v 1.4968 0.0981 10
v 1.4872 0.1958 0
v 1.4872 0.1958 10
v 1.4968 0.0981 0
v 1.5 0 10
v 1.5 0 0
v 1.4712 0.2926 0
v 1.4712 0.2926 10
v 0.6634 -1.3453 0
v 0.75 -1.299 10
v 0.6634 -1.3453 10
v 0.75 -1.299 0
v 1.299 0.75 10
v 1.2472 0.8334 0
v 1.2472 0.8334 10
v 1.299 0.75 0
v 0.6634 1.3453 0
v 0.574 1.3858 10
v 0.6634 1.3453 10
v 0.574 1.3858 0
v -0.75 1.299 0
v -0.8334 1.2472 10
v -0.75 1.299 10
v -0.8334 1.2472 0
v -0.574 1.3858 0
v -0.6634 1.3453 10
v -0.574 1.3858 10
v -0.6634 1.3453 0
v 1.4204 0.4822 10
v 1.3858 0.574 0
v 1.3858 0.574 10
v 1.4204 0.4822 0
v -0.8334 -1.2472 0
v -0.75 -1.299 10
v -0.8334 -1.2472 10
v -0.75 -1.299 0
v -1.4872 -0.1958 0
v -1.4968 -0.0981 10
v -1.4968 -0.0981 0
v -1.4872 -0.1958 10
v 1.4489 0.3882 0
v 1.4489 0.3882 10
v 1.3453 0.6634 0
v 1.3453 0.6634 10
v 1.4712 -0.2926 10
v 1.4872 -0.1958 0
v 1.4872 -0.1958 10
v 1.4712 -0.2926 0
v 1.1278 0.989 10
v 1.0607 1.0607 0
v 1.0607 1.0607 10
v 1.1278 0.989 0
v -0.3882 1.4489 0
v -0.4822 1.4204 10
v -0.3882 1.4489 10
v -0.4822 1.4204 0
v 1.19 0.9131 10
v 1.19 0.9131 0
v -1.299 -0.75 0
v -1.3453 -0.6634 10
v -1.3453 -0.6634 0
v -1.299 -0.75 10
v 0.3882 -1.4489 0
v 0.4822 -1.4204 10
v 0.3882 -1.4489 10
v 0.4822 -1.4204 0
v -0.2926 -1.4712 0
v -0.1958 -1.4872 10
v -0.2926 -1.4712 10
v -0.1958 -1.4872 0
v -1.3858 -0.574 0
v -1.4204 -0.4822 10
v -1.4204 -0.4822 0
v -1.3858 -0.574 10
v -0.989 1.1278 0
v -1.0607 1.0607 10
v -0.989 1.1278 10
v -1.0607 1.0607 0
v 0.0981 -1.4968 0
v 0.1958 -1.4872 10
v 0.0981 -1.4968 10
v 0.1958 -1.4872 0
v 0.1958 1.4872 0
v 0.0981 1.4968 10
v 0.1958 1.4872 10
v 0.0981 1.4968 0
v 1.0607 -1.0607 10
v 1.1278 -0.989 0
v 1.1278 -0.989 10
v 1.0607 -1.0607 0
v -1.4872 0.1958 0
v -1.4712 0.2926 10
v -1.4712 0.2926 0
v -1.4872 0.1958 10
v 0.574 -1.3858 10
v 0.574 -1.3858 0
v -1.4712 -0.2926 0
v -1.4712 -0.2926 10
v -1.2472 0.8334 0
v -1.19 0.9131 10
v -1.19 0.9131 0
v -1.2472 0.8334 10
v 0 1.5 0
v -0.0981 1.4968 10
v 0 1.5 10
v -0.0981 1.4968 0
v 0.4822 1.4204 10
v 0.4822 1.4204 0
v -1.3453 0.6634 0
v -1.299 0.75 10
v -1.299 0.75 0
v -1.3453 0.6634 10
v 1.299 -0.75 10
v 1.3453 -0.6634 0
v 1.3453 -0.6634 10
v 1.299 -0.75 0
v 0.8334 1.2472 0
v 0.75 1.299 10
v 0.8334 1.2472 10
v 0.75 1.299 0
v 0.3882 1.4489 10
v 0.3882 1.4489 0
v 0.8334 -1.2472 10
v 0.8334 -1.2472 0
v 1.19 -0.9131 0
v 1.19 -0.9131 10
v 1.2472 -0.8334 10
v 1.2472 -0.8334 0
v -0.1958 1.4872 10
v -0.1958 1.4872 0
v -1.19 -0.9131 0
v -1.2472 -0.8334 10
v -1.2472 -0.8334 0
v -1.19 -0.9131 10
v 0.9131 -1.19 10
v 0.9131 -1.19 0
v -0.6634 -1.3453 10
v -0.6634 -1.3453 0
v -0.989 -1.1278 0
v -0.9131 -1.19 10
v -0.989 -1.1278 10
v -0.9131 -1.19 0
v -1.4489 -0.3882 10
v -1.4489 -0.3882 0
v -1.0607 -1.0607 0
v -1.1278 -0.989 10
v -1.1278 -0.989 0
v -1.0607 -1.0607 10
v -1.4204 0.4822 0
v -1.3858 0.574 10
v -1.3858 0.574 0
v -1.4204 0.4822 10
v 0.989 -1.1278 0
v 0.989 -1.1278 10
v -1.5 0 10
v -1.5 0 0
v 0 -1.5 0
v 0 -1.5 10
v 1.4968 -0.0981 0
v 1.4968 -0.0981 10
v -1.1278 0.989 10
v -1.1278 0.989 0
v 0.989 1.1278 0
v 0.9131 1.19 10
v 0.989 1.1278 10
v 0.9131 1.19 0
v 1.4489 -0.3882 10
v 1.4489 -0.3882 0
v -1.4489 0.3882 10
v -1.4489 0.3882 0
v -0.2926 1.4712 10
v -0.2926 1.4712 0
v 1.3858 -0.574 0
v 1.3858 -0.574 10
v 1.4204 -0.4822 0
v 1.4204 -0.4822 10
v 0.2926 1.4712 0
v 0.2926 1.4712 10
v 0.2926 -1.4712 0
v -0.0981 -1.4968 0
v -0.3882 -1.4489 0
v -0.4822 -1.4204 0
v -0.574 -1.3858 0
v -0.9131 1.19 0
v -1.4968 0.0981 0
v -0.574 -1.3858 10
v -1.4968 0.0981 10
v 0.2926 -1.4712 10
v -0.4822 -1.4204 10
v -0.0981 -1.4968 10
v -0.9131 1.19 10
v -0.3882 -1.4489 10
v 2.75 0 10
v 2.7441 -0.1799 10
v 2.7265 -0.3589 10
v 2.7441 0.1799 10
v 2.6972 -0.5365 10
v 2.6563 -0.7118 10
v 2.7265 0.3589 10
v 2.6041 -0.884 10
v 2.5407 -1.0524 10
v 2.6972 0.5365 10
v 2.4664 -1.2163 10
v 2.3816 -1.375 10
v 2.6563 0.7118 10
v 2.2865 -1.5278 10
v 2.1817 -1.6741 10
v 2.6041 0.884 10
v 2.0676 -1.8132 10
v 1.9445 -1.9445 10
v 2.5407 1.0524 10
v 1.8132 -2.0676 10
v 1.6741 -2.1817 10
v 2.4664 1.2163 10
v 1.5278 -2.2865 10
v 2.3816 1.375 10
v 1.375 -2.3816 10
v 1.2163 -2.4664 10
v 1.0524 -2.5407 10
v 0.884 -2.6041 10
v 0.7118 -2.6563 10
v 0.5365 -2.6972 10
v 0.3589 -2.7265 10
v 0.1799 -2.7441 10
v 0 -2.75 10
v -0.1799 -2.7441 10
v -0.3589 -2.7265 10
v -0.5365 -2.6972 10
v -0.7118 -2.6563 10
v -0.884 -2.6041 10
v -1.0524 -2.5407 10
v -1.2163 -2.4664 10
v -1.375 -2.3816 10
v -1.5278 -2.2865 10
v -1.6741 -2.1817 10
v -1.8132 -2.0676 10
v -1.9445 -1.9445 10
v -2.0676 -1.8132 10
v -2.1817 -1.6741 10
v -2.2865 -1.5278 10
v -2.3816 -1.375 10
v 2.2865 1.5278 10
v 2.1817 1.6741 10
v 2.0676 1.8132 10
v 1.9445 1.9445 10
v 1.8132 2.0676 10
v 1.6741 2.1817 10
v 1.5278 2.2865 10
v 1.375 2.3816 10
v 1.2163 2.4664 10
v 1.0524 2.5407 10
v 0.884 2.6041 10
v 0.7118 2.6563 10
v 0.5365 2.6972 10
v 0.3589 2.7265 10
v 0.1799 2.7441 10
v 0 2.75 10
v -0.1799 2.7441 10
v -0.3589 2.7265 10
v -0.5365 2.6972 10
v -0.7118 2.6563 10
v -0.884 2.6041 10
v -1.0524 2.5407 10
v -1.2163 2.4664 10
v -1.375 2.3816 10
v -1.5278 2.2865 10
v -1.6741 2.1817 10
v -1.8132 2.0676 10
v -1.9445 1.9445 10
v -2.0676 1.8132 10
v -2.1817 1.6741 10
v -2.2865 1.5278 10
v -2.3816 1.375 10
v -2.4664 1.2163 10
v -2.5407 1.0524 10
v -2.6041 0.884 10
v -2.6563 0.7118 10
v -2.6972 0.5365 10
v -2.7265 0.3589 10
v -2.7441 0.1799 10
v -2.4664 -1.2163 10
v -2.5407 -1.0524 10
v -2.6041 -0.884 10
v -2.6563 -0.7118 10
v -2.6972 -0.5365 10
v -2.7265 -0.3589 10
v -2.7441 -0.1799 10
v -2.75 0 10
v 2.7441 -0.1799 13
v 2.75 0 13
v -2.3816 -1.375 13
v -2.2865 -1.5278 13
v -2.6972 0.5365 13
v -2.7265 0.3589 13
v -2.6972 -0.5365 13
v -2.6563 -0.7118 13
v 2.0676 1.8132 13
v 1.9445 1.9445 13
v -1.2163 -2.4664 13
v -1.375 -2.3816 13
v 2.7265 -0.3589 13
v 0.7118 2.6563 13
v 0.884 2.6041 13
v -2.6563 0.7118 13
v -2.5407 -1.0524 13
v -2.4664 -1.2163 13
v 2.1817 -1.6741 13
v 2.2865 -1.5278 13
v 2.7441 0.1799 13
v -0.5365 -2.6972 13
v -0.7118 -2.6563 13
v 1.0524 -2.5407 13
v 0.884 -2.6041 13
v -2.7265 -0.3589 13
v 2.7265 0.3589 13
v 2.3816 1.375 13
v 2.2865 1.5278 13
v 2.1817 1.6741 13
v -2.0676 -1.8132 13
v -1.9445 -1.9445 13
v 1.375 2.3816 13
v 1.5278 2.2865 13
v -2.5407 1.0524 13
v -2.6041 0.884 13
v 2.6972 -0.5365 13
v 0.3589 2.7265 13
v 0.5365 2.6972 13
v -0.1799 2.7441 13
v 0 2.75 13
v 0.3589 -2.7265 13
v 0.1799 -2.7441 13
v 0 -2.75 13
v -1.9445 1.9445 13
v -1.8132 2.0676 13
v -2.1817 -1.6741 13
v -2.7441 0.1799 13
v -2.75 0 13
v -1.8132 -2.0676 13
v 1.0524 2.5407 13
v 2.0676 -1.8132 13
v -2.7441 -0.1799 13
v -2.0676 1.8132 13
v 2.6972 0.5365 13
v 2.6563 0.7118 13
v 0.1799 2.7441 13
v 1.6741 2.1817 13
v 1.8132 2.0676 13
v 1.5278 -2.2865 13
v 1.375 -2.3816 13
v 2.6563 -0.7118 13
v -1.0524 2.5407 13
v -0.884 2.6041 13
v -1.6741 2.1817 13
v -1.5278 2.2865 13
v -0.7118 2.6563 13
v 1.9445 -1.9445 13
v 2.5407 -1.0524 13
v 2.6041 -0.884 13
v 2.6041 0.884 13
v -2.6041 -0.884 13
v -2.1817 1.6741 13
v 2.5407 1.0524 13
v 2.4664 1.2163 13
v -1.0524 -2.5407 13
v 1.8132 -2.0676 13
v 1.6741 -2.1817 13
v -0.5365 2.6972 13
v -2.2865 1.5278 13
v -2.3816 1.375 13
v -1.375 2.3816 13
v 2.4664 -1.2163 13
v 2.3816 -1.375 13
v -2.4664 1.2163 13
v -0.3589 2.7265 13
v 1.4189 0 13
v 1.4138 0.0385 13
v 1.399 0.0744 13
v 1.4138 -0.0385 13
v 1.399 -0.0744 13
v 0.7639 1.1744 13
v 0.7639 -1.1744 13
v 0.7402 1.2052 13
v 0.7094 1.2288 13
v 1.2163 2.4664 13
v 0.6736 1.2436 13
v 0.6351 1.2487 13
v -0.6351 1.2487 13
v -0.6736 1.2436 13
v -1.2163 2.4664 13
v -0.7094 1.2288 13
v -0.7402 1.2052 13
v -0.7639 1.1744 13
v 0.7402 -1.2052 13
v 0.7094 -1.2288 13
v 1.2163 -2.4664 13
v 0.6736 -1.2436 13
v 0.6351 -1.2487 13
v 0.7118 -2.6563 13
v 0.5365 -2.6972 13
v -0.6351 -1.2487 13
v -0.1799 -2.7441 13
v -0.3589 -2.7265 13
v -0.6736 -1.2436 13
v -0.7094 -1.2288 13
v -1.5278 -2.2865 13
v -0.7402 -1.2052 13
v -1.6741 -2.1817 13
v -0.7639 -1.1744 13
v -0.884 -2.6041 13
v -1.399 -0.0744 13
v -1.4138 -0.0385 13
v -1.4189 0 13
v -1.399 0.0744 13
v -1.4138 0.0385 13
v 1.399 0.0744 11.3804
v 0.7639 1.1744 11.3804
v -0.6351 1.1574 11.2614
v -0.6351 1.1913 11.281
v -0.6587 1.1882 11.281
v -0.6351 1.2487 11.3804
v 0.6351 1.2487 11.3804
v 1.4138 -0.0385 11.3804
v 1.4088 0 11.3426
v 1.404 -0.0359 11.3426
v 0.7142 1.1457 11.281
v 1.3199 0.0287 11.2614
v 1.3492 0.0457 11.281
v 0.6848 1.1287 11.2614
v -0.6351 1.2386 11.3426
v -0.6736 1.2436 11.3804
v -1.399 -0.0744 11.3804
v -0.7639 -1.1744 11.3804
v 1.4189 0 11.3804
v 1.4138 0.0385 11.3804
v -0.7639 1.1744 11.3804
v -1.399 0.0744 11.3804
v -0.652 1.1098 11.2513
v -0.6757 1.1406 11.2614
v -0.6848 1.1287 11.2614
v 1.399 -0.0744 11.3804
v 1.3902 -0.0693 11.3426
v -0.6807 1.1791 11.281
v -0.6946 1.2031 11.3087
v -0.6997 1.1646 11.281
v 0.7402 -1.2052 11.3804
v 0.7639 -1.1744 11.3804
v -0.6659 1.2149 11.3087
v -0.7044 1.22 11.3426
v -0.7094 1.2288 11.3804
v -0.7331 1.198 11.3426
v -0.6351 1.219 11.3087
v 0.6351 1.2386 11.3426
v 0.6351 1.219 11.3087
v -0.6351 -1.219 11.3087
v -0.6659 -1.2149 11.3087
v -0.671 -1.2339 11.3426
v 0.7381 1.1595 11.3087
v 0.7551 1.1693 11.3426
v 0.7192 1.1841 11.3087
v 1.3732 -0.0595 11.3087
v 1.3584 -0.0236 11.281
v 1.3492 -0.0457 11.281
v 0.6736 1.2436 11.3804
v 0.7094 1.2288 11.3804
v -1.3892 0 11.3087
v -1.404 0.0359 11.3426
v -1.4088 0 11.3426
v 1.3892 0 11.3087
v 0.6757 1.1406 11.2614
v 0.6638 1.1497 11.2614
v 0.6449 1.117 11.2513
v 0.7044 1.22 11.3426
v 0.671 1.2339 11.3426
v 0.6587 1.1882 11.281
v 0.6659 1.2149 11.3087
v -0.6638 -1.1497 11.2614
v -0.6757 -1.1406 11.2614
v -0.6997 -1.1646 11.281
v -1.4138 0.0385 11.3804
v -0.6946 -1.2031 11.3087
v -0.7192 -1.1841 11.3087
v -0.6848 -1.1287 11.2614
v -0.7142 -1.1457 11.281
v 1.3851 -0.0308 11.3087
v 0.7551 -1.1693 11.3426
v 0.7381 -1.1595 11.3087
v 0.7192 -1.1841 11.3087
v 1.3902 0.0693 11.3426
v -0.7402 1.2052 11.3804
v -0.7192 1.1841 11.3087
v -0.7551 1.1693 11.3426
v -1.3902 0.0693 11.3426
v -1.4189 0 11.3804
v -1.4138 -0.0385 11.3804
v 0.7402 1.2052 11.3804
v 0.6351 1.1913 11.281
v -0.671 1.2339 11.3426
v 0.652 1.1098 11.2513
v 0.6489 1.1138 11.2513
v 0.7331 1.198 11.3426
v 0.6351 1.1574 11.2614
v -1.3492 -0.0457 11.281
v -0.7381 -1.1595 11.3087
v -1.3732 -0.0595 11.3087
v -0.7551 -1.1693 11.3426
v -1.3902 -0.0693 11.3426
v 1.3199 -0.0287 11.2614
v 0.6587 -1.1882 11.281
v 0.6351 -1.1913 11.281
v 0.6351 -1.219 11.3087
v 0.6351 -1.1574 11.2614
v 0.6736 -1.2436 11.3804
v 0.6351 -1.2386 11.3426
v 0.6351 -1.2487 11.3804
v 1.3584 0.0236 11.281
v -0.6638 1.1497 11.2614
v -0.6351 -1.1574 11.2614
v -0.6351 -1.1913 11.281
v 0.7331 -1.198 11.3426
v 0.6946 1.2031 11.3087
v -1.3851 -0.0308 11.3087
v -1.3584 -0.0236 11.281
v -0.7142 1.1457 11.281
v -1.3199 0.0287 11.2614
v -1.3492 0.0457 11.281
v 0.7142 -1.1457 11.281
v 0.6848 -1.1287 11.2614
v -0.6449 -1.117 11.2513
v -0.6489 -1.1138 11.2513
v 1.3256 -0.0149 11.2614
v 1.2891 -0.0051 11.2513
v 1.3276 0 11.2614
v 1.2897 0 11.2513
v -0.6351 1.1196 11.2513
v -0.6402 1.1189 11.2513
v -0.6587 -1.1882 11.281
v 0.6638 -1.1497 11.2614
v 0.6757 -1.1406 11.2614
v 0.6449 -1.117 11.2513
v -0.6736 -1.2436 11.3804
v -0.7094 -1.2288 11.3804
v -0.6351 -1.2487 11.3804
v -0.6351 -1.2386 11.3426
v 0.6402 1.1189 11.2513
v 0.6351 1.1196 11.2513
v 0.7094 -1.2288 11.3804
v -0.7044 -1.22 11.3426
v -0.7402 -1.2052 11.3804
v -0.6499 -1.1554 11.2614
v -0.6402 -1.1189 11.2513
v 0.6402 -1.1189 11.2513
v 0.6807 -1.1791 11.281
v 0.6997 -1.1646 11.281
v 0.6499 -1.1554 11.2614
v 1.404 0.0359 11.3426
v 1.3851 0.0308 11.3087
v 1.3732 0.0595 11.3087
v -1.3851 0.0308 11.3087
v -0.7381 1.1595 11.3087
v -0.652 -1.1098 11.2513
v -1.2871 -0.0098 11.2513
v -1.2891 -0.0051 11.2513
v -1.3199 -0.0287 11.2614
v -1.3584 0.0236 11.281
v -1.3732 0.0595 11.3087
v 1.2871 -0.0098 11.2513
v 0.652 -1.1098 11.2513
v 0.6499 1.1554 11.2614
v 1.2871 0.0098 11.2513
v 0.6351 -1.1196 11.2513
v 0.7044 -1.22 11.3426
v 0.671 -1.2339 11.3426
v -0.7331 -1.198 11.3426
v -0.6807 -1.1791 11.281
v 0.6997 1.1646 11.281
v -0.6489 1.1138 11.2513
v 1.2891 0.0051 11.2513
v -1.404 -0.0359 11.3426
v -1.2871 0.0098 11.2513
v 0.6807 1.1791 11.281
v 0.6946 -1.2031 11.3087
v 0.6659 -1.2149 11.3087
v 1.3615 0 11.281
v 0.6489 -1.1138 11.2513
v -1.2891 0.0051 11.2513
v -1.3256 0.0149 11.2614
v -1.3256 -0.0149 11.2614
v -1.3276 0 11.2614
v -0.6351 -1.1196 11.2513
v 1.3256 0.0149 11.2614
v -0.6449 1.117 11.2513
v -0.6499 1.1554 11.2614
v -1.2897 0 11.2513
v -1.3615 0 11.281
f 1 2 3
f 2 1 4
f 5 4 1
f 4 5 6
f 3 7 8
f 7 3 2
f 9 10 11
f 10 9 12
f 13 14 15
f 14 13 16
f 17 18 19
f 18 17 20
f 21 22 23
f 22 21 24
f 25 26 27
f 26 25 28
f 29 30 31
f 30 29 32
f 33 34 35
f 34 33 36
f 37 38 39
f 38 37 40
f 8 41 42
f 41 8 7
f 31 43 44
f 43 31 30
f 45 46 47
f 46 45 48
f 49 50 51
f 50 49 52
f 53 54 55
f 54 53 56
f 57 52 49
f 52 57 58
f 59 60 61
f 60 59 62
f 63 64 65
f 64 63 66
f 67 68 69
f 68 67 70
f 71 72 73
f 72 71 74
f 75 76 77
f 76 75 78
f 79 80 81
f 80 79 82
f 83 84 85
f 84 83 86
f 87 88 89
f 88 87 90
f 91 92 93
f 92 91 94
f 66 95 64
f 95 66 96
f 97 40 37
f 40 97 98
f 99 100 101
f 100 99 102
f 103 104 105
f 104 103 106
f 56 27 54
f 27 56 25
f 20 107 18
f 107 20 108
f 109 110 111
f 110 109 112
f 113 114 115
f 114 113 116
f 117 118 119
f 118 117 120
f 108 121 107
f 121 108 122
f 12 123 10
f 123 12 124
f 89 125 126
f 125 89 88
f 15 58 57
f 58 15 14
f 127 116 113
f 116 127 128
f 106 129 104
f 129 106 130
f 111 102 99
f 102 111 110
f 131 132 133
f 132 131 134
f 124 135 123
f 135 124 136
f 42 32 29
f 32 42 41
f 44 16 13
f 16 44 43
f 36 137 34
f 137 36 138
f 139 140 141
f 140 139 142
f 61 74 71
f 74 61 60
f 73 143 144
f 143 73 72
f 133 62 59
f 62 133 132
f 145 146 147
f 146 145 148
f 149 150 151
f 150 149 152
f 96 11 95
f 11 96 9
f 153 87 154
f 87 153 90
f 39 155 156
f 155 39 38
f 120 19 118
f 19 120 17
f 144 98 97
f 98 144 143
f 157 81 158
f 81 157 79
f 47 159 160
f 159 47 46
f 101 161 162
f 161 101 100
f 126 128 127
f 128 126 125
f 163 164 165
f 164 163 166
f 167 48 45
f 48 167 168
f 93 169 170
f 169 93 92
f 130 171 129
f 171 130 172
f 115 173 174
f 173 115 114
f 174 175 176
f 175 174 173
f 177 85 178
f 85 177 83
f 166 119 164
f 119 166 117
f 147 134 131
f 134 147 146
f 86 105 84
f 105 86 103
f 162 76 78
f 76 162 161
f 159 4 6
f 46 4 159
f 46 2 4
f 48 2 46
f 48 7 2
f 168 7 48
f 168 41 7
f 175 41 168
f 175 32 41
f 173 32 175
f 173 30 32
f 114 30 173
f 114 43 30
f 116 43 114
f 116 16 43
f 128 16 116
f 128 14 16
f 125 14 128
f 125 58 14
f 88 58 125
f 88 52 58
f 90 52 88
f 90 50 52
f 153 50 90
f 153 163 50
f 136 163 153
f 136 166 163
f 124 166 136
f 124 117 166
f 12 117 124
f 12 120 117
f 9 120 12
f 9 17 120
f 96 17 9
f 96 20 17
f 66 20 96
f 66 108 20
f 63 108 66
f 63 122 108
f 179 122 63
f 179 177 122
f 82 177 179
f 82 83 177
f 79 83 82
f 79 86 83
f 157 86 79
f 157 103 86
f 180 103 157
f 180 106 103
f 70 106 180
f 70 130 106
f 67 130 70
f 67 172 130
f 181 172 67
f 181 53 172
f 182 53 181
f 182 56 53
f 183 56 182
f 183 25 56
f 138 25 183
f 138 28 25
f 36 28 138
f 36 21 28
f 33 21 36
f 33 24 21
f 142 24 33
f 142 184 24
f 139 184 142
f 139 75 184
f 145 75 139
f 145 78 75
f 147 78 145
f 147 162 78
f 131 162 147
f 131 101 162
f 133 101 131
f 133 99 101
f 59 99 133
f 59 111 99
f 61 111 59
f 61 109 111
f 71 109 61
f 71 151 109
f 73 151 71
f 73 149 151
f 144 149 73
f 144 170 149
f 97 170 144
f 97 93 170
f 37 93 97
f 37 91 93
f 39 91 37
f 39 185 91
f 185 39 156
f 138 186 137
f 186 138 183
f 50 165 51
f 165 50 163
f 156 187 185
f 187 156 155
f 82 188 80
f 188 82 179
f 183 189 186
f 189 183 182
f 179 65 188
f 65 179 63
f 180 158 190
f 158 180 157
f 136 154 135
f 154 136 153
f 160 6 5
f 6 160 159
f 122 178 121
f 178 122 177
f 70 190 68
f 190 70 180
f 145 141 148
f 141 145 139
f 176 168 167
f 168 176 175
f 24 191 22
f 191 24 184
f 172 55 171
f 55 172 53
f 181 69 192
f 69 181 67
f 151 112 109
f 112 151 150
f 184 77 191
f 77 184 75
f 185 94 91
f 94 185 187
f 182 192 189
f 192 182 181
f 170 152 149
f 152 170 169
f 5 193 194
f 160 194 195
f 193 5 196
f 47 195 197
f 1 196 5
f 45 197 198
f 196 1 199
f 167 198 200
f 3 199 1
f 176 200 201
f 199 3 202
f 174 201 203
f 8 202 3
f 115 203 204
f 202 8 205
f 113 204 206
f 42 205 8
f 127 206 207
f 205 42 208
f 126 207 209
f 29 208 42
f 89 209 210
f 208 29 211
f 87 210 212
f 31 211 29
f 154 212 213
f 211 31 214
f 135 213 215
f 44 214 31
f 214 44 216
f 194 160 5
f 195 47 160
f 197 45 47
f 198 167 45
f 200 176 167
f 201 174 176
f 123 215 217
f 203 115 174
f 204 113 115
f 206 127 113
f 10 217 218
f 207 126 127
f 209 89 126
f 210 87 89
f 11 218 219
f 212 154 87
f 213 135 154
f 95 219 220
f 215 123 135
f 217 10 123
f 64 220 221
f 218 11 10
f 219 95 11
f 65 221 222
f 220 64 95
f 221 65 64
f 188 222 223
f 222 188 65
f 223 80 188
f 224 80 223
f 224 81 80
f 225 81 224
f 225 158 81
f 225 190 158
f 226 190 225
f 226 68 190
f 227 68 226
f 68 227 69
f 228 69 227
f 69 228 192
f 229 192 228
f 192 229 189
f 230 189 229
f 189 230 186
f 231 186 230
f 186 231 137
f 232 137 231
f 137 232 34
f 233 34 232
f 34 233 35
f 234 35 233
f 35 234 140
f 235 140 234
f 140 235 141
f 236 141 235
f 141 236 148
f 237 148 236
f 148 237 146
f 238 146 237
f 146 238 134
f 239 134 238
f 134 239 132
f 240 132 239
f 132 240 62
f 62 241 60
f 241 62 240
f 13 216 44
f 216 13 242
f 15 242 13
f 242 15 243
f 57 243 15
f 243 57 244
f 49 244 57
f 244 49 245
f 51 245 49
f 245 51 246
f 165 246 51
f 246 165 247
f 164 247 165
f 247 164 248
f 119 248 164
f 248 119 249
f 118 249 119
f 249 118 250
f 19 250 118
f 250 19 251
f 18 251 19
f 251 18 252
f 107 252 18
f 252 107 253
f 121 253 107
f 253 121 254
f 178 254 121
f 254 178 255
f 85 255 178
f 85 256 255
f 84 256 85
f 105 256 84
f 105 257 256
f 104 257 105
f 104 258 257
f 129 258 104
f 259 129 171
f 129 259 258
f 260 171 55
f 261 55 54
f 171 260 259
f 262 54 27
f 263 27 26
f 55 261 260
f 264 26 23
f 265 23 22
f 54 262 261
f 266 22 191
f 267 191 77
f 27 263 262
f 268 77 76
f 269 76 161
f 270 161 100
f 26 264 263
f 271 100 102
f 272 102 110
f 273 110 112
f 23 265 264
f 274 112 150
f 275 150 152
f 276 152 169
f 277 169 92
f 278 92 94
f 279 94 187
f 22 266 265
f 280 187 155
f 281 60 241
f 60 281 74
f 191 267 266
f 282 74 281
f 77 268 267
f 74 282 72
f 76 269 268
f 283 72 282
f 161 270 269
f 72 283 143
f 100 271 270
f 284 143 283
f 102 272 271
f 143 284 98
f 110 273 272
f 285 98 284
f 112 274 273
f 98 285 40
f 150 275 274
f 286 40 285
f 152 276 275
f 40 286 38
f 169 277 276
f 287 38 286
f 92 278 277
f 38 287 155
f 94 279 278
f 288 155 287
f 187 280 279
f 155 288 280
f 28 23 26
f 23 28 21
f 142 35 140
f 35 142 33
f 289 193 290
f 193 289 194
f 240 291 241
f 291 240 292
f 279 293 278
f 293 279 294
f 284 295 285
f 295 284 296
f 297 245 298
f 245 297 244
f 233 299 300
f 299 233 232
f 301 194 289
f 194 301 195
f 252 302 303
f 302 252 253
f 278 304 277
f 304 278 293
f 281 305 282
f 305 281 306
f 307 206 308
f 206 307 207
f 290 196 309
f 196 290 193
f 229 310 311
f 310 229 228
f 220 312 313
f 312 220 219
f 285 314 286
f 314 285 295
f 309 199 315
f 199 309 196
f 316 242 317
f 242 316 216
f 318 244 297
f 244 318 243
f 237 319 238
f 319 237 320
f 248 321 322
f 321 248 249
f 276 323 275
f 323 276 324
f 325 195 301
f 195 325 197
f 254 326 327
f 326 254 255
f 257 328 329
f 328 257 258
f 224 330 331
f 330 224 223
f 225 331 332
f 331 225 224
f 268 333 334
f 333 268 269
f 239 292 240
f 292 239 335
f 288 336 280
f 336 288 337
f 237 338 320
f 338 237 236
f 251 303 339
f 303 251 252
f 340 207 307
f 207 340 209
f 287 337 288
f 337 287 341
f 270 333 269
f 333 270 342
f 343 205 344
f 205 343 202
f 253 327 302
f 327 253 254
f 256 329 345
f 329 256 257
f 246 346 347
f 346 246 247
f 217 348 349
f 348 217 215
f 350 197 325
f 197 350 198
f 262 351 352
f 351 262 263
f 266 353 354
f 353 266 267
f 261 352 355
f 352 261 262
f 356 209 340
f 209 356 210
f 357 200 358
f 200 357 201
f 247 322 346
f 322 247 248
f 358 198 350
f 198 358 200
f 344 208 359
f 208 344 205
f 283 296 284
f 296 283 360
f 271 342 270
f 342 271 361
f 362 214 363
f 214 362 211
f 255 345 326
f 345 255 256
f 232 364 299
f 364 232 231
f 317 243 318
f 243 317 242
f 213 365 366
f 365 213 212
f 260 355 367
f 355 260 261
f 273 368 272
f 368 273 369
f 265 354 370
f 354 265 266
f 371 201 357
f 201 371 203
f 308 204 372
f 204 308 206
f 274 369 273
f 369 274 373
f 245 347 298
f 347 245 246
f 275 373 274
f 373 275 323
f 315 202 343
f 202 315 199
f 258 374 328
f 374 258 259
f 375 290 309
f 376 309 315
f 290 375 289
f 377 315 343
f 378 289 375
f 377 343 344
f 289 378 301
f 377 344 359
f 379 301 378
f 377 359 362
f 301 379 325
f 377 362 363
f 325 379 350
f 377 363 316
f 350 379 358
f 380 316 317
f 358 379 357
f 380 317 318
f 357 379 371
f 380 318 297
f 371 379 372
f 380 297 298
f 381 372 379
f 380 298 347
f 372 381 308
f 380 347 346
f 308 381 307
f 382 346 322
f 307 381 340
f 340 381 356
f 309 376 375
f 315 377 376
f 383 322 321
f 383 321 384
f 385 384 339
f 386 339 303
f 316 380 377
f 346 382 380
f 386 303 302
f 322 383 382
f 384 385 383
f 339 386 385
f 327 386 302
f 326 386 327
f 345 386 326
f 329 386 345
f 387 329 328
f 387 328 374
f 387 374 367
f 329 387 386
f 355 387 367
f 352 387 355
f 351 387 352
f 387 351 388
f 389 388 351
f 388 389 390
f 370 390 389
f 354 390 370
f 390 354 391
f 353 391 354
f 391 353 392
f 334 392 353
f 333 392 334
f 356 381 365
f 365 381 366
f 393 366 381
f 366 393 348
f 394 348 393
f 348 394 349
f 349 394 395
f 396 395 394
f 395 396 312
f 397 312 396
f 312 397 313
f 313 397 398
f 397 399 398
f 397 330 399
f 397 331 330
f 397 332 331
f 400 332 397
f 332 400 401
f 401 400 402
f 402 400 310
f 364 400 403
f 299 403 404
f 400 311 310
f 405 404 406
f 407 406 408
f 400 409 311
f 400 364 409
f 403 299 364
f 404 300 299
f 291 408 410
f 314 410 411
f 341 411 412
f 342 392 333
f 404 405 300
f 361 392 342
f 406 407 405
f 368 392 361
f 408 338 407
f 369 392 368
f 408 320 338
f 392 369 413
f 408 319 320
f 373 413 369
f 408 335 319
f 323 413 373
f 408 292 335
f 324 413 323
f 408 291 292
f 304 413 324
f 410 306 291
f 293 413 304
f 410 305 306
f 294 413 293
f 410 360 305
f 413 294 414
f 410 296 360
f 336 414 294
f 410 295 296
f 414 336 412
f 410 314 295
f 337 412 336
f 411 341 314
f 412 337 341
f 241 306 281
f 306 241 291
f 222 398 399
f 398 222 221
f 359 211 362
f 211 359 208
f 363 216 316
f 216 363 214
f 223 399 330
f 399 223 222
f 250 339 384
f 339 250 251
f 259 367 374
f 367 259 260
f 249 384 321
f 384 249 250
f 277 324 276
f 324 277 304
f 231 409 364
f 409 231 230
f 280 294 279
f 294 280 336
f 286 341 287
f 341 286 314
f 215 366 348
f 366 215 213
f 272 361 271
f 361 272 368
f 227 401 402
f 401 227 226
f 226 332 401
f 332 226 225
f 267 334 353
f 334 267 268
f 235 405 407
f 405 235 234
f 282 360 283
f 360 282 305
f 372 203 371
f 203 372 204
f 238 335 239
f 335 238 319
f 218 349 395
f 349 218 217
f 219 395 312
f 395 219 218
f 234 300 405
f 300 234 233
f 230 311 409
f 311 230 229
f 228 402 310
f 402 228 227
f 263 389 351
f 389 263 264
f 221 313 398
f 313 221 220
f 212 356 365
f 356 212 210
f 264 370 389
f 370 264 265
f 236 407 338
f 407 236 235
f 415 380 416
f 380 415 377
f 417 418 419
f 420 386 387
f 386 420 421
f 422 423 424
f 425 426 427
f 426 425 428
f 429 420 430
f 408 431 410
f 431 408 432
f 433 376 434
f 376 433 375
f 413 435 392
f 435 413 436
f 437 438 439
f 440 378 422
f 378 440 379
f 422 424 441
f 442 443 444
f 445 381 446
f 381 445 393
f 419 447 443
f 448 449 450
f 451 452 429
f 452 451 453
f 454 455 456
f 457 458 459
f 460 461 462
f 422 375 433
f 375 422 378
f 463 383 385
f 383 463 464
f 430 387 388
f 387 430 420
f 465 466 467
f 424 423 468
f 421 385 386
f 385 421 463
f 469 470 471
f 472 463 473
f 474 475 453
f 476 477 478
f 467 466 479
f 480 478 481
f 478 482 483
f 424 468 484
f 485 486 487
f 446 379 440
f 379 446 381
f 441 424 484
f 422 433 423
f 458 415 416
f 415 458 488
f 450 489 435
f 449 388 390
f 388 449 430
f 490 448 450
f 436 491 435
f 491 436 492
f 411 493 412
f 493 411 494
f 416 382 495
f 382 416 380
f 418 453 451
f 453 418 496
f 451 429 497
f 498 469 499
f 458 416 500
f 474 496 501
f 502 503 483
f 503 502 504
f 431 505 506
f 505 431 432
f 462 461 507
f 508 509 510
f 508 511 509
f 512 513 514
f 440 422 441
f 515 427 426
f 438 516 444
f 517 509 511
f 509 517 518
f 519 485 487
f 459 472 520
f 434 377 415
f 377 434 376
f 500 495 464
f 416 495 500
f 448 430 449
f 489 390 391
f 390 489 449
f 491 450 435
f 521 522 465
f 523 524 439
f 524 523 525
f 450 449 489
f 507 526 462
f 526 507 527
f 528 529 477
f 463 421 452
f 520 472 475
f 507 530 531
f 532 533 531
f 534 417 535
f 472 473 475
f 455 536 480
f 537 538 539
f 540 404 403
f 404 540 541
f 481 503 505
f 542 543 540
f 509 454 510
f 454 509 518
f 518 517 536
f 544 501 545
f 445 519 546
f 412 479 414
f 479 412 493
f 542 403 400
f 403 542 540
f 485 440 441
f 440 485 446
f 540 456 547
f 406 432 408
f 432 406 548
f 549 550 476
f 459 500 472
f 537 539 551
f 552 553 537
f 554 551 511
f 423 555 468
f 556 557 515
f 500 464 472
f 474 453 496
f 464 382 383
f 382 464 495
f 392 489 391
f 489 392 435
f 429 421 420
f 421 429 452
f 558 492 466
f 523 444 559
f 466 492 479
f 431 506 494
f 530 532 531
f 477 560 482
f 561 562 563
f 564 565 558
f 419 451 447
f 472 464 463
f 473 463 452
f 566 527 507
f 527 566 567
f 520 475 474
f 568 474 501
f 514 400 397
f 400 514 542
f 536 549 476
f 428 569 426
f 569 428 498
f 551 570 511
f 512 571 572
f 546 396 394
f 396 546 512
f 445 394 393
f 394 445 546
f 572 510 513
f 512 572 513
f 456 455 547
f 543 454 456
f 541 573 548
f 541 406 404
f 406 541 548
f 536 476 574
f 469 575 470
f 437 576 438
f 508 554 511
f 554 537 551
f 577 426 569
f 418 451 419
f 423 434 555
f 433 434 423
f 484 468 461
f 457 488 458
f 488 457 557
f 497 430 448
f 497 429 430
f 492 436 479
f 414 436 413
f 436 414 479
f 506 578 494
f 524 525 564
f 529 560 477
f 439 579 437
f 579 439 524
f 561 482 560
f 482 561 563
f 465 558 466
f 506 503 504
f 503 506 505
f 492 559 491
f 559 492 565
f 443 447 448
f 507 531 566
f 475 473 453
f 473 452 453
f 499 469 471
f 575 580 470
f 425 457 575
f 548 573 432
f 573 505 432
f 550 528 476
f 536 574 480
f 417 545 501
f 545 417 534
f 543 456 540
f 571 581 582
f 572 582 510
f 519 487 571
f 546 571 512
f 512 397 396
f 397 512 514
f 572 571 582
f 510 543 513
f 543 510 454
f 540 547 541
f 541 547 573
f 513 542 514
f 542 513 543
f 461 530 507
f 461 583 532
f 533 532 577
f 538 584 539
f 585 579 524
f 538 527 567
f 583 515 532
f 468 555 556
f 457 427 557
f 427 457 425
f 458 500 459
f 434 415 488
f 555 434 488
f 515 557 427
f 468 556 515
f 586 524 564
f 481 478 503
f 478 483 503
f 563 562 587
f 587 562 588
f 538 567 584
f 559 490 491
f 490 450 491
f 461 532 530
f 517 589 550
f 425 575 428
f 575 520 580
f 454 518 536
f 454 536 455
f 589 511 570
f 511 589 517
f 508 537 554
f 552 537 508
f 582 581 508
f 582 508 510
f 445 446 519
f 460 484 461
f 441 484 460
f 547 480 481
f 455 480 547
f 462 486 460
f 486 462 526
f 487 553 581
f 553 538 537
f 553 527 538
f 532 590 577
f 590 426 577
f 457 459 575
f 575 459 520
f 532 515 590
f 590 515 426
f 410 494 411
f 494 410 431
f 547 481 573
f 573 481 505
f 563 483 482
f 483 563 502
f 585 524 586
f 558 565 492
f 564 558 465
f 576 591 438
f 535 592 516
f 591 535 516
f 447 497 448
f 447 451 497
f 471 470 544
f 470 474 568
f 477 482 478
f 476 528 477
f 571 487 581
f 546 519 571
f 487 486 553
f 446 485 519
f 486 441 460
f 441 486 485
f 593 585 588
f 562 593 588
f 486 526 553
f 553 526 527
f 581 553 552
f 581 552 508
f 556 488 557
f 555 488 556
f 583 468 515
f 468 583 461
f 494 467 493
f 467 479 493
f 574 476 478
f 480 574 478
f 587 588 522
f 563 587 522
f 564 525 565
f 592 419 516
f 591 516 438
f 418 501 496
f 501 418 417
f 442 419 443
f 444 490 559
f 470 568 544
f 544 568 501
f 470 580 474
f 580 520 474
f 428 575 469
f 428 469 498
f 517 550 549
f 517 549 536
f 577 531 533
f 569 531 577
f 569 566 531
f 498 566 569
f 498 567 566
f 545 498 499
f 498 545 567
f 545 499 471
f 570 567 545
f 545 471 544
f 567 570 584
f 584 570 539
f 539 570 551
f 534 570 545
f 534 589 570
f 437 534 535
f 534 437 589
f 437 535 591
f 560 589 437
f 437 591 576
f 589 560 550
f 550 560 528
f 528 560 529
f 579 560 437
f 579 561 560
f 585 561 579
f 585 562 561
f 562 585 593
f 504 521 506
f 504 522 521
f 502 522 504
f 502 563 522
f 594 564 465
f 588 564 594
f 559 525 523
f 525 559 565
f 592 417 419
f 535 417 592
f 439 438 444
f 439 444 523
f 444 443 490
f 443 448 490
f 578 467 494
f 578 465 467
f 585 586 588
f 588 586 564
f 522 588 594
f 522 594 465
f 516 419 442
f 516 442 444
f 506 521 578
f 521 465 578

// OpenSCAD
$fn = 96;

d_shaft = 3.0;
L = 10.0;

d_head = 5.5;
h_head = 3.0;

// Approximate hex socket dimensions for an M3 socket head cap screw
socket_af = 2.5;          // across flats
socket_depth = 1.6;       // depth
socket_corner_r = 0.15;   // slight rounding

module hex_prism(af, h) {
    // Regular hex with across-flats = af
    r = af / sqrt(3); // circumradius
    cylinder(h = h, r = r, $fn = 6);
}

module socket_head_cap_screw() {
    difference() {
        union() {
            // Shaft
            cylinder(h = L, d = d_shaft);

            // Head
            translate([0,0,L])
                cylinder(h = h_head, d = d_head);
        }

        // Hex socket cut
        translate([0,0,L + h_head - socket_depth])
            minkowski() {
                hex_prism(socket_af - 2*socket_corner_r, socket_depth);
                sphere(r = socket_corner_r, $fn = 24);
            }
    }
}

socket_head_cap_screw();
